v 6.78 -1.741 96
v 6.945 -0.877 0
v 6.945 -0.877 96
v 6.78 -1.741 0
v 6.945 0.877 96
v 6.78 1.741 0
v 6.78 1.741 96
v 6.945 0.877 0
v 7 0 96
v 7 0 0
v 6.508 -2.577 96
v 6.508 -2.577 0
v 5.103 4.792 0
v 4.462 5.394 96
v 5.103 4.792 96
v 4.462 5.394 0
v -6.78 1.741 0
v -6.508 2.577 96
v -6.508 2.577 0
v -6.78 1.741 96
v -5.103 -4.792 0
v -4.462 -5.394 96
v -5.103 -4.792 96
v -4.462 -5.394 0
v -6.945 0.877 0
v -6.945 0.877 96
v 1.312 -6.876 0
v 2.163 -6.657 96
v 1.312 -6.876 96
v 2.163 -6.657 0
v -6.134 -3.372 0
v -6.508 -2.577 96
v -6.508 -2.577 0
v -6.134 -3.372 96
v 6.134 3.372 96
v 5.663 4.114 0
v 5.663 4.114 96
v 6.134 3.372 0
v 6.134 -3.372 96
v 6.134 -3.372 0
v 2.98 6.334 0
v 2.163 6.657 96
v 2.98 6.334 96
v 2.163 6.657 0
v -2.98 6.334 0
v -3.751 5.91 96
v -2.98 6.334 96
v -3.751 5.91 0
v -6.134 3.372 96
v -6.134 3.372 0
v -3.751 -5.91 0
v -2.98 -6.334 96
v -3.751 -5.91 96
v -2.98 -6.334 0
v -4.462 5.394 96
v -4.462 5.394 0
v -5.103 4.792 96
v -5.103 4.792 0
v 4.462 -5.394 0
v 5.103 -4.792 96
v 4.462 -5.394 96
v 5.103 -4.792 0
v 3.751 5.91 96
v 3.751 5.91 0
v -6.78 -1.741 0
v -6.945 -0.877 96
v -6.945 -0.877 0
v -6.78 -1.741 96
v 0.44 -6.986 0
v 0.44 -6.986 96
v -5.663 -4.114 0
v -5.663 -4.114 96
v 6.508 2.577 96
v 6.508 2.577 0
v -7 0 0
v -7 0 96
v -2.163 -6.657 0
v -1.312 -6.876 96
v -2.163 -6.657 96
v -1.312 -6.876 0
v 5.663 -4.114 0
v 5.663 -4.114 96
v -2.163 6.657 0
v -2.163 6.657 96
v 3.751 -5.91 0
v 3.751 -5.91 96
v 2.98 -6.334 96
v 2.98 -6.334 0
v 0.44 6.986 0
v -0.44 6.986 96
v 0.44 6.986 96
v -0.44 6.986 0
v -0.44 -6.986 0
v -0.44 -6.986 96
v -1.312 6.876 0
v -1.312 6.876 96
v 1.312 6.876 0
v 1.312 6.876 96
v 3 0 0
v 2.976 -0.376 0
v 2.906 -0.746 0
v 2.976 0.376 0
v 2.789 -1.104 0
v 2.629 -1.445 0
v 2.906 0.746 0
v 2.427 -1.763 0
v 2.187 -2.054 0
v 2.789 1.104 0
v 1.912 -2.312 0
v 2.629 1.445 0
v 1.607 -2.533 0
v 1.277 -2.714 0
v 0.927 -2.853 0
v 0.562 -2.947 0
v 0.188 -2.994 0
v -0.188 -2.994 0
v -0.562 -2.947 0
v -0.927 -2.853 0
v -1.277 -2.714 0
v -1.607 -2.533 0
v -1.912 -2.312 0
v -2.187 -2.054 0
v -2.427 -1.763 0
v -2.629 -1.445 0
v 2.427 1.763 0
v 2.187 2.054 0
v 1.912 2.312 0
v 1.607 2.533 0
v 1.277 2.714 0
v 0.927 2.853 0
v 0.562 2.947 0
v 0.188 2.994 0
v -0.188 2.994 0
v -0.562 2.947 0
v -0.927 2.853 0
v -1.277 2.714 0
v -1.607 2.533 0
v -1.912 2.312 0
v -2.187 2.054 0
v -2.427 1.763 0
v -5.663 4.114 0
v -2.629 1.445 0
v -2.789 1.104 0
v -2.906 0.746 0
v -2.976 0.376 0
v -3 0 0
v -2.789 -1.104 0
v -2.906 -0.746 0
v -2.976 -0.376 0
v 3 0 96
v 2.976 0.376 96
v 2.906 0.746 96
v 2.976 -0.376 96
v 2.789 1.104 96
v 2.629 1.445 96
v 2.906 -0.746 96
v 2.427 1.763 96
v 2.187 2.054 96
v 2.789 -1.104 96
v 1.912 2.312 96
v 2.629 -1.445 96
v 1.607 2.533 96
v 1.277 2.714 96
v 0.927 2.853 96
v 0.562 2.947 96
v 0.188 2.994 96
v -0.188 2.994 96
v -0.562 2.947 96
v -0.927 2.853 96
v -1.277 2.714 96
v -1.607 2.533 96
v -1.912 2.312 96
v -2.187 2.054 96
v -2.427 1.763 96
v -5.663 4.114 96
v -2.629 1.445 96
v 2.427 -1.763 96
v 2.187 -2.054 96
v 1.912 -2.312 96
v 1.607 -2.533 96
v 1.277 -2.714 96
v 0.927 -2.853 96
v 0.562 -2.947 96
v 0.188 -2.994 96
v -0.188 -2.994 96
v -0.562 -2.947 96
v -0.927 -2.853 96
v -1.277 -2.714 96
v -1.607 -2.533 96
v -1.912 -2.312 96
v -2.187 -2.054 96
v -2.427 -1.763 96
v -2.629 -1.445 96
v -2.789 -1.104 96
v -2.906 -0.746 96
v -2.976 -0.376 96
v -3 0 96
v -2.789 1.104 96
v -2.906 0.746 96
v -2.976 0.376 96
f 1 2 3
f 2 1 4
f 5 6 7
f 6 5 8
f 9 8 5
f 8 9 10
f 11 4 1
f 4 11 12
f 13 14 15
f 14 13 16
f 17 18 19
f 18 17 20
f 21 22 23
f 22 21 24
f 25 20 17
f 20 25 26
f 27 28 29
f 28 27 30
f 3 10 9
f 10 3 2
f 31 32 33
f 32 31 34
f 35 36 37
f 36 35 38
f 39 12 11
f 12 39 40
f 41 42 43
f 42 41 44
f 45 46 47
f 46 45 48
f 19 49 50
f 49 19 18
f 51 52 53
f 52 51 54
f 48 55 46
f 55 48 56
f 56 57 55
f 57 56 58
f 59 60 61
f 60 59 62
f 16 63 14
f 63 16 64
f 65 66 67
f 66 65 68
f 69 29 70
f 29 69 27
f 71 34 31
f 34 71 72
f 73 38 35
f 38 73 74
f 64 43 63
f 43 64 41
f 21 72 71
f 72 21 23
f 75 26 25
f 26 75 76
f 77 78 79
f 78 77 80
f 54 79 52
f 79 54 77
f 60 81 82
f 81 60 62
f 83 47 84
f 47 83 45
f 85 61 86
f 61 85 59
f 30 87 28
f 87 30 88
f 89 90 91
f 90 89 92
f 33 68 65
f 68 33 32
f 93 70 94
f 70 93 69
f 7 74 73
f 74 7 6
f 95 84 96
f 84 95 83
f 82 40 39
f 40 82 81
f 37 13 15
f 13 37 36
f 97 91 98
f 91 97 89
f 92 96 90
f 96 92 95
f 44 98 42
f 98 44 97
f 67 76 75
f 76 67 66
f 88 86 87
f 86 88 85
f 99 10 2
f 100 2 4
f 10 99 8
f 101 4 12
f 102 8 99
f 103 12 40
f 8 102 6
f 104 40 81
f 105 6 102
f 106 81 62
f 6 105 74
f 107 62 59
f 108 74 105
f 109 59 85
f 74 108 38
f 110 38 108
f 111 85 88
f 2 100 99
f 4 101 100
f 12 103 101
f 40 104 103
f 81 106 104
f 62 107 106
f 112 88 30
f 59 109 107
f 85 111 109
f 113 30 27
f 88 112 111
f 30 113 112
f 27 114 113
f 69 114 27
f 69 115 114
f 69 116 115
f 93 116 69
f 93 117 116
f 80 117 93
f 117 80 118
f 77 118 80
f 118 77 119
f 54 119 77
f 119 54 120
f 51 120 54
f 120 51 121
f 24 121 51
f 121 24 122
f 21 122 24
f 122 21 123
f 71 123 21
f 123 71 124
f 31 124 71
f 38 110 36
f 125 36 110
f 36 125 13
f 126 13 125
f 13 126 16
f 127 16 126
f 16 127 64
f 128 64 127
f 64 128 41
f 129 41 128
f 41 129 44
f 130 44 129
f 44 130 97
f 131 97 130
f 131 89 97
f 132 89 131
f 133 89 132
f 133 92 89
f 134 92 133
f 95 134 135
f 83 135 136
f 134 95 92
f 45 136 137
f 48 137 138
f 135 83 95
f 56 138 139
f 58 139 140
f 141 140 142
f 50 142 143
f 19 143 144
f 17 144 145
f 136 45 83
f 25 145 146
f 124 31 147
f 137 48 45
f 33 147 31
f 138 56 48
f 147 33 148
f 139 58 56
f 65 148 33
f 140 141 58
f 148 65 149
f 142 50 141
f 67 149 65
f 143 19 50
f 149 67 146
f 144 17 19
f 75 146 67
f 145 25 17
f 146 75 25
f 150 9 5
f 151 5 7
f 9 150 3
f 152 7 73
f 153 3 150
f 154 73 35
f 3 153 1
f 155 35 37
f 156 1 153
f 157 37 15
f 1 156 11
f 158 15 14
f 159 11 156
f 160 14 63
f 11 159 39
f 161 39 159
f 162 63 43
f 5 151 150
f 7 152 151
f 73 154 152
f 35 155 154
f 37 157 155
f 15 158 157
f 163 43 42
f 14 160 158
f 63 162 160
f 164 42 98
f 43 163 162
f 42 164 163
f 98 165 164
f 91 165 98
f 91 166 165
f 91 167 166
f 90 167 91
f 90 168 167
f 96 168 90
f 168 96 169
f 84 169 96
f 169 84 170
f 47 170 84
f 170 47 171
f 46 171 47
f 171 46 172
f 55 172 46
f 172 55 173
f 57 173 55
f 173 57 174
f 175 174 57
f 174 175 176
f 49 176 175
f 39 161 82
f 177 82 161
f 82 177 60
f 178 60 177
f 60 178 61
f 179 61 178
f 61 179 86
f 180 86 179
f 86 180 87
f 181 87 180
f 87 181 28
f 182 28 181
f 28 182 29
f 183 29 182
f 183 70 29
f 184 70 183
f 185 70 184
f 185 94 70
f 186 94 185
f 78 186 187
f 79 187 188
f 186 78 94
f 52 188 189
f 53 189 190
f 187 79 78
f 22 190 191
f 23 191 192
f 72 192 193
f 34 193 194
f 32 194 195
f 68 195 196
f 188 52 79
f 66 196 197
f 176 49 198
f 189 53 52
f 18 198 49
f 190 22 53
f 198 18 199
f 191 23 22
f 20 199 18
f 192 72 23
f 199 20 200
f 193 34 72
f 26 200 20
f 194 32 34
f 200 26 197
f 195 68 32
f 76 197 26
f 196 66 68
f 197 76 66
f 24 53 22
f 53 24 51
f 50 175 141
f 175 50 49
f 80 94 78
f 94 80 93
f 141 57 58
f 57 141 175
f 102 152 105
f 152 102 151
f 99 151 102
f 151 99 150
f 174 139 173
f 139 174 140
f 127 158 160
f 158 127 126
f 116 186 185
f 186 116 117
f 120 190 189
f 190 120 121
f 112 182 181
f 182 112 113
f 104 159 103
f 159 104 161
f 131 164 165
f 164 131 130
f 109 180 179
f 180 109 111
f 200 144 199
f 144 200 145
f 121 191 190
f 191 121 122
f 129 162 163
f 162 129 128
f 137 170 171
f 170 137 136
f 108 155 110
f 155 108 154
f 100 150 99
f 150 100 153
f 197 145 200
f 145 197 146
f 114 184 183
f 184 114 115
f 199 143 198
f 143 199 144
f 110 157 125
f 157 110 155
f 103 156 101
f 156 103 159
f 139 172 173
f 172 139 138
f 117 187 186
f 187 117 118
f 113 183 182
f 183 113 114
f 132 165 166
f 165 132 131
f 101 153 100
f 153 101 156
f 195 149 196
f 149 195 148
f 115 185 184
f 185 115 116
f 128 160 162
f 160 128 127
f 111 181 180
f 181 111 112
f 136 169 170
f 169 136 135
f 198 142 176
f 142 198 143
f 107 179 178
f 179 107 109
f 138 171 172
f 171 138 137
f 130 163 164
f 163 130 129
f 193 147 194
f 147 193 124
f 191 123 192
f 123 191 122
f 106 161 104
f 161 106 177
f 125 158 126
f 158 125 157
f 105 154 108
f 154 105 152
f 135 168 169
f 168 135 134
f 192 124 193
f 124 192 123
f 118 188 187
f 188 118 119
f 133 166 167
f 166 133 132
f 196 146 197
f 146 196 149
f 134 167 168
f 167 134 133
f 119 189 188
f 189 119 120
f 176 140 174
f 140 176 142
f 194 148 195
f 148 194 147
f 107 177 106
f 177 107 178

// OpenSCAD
$fn = 50;


difference() {
	union() {
		cylinder(h = 96, r = 7.0000000000);
	}
	union() {
		translate(v = [0, 0, -100]) {
			cylinder(h = 200, r = 3.0000000000);
		}
	}
}
